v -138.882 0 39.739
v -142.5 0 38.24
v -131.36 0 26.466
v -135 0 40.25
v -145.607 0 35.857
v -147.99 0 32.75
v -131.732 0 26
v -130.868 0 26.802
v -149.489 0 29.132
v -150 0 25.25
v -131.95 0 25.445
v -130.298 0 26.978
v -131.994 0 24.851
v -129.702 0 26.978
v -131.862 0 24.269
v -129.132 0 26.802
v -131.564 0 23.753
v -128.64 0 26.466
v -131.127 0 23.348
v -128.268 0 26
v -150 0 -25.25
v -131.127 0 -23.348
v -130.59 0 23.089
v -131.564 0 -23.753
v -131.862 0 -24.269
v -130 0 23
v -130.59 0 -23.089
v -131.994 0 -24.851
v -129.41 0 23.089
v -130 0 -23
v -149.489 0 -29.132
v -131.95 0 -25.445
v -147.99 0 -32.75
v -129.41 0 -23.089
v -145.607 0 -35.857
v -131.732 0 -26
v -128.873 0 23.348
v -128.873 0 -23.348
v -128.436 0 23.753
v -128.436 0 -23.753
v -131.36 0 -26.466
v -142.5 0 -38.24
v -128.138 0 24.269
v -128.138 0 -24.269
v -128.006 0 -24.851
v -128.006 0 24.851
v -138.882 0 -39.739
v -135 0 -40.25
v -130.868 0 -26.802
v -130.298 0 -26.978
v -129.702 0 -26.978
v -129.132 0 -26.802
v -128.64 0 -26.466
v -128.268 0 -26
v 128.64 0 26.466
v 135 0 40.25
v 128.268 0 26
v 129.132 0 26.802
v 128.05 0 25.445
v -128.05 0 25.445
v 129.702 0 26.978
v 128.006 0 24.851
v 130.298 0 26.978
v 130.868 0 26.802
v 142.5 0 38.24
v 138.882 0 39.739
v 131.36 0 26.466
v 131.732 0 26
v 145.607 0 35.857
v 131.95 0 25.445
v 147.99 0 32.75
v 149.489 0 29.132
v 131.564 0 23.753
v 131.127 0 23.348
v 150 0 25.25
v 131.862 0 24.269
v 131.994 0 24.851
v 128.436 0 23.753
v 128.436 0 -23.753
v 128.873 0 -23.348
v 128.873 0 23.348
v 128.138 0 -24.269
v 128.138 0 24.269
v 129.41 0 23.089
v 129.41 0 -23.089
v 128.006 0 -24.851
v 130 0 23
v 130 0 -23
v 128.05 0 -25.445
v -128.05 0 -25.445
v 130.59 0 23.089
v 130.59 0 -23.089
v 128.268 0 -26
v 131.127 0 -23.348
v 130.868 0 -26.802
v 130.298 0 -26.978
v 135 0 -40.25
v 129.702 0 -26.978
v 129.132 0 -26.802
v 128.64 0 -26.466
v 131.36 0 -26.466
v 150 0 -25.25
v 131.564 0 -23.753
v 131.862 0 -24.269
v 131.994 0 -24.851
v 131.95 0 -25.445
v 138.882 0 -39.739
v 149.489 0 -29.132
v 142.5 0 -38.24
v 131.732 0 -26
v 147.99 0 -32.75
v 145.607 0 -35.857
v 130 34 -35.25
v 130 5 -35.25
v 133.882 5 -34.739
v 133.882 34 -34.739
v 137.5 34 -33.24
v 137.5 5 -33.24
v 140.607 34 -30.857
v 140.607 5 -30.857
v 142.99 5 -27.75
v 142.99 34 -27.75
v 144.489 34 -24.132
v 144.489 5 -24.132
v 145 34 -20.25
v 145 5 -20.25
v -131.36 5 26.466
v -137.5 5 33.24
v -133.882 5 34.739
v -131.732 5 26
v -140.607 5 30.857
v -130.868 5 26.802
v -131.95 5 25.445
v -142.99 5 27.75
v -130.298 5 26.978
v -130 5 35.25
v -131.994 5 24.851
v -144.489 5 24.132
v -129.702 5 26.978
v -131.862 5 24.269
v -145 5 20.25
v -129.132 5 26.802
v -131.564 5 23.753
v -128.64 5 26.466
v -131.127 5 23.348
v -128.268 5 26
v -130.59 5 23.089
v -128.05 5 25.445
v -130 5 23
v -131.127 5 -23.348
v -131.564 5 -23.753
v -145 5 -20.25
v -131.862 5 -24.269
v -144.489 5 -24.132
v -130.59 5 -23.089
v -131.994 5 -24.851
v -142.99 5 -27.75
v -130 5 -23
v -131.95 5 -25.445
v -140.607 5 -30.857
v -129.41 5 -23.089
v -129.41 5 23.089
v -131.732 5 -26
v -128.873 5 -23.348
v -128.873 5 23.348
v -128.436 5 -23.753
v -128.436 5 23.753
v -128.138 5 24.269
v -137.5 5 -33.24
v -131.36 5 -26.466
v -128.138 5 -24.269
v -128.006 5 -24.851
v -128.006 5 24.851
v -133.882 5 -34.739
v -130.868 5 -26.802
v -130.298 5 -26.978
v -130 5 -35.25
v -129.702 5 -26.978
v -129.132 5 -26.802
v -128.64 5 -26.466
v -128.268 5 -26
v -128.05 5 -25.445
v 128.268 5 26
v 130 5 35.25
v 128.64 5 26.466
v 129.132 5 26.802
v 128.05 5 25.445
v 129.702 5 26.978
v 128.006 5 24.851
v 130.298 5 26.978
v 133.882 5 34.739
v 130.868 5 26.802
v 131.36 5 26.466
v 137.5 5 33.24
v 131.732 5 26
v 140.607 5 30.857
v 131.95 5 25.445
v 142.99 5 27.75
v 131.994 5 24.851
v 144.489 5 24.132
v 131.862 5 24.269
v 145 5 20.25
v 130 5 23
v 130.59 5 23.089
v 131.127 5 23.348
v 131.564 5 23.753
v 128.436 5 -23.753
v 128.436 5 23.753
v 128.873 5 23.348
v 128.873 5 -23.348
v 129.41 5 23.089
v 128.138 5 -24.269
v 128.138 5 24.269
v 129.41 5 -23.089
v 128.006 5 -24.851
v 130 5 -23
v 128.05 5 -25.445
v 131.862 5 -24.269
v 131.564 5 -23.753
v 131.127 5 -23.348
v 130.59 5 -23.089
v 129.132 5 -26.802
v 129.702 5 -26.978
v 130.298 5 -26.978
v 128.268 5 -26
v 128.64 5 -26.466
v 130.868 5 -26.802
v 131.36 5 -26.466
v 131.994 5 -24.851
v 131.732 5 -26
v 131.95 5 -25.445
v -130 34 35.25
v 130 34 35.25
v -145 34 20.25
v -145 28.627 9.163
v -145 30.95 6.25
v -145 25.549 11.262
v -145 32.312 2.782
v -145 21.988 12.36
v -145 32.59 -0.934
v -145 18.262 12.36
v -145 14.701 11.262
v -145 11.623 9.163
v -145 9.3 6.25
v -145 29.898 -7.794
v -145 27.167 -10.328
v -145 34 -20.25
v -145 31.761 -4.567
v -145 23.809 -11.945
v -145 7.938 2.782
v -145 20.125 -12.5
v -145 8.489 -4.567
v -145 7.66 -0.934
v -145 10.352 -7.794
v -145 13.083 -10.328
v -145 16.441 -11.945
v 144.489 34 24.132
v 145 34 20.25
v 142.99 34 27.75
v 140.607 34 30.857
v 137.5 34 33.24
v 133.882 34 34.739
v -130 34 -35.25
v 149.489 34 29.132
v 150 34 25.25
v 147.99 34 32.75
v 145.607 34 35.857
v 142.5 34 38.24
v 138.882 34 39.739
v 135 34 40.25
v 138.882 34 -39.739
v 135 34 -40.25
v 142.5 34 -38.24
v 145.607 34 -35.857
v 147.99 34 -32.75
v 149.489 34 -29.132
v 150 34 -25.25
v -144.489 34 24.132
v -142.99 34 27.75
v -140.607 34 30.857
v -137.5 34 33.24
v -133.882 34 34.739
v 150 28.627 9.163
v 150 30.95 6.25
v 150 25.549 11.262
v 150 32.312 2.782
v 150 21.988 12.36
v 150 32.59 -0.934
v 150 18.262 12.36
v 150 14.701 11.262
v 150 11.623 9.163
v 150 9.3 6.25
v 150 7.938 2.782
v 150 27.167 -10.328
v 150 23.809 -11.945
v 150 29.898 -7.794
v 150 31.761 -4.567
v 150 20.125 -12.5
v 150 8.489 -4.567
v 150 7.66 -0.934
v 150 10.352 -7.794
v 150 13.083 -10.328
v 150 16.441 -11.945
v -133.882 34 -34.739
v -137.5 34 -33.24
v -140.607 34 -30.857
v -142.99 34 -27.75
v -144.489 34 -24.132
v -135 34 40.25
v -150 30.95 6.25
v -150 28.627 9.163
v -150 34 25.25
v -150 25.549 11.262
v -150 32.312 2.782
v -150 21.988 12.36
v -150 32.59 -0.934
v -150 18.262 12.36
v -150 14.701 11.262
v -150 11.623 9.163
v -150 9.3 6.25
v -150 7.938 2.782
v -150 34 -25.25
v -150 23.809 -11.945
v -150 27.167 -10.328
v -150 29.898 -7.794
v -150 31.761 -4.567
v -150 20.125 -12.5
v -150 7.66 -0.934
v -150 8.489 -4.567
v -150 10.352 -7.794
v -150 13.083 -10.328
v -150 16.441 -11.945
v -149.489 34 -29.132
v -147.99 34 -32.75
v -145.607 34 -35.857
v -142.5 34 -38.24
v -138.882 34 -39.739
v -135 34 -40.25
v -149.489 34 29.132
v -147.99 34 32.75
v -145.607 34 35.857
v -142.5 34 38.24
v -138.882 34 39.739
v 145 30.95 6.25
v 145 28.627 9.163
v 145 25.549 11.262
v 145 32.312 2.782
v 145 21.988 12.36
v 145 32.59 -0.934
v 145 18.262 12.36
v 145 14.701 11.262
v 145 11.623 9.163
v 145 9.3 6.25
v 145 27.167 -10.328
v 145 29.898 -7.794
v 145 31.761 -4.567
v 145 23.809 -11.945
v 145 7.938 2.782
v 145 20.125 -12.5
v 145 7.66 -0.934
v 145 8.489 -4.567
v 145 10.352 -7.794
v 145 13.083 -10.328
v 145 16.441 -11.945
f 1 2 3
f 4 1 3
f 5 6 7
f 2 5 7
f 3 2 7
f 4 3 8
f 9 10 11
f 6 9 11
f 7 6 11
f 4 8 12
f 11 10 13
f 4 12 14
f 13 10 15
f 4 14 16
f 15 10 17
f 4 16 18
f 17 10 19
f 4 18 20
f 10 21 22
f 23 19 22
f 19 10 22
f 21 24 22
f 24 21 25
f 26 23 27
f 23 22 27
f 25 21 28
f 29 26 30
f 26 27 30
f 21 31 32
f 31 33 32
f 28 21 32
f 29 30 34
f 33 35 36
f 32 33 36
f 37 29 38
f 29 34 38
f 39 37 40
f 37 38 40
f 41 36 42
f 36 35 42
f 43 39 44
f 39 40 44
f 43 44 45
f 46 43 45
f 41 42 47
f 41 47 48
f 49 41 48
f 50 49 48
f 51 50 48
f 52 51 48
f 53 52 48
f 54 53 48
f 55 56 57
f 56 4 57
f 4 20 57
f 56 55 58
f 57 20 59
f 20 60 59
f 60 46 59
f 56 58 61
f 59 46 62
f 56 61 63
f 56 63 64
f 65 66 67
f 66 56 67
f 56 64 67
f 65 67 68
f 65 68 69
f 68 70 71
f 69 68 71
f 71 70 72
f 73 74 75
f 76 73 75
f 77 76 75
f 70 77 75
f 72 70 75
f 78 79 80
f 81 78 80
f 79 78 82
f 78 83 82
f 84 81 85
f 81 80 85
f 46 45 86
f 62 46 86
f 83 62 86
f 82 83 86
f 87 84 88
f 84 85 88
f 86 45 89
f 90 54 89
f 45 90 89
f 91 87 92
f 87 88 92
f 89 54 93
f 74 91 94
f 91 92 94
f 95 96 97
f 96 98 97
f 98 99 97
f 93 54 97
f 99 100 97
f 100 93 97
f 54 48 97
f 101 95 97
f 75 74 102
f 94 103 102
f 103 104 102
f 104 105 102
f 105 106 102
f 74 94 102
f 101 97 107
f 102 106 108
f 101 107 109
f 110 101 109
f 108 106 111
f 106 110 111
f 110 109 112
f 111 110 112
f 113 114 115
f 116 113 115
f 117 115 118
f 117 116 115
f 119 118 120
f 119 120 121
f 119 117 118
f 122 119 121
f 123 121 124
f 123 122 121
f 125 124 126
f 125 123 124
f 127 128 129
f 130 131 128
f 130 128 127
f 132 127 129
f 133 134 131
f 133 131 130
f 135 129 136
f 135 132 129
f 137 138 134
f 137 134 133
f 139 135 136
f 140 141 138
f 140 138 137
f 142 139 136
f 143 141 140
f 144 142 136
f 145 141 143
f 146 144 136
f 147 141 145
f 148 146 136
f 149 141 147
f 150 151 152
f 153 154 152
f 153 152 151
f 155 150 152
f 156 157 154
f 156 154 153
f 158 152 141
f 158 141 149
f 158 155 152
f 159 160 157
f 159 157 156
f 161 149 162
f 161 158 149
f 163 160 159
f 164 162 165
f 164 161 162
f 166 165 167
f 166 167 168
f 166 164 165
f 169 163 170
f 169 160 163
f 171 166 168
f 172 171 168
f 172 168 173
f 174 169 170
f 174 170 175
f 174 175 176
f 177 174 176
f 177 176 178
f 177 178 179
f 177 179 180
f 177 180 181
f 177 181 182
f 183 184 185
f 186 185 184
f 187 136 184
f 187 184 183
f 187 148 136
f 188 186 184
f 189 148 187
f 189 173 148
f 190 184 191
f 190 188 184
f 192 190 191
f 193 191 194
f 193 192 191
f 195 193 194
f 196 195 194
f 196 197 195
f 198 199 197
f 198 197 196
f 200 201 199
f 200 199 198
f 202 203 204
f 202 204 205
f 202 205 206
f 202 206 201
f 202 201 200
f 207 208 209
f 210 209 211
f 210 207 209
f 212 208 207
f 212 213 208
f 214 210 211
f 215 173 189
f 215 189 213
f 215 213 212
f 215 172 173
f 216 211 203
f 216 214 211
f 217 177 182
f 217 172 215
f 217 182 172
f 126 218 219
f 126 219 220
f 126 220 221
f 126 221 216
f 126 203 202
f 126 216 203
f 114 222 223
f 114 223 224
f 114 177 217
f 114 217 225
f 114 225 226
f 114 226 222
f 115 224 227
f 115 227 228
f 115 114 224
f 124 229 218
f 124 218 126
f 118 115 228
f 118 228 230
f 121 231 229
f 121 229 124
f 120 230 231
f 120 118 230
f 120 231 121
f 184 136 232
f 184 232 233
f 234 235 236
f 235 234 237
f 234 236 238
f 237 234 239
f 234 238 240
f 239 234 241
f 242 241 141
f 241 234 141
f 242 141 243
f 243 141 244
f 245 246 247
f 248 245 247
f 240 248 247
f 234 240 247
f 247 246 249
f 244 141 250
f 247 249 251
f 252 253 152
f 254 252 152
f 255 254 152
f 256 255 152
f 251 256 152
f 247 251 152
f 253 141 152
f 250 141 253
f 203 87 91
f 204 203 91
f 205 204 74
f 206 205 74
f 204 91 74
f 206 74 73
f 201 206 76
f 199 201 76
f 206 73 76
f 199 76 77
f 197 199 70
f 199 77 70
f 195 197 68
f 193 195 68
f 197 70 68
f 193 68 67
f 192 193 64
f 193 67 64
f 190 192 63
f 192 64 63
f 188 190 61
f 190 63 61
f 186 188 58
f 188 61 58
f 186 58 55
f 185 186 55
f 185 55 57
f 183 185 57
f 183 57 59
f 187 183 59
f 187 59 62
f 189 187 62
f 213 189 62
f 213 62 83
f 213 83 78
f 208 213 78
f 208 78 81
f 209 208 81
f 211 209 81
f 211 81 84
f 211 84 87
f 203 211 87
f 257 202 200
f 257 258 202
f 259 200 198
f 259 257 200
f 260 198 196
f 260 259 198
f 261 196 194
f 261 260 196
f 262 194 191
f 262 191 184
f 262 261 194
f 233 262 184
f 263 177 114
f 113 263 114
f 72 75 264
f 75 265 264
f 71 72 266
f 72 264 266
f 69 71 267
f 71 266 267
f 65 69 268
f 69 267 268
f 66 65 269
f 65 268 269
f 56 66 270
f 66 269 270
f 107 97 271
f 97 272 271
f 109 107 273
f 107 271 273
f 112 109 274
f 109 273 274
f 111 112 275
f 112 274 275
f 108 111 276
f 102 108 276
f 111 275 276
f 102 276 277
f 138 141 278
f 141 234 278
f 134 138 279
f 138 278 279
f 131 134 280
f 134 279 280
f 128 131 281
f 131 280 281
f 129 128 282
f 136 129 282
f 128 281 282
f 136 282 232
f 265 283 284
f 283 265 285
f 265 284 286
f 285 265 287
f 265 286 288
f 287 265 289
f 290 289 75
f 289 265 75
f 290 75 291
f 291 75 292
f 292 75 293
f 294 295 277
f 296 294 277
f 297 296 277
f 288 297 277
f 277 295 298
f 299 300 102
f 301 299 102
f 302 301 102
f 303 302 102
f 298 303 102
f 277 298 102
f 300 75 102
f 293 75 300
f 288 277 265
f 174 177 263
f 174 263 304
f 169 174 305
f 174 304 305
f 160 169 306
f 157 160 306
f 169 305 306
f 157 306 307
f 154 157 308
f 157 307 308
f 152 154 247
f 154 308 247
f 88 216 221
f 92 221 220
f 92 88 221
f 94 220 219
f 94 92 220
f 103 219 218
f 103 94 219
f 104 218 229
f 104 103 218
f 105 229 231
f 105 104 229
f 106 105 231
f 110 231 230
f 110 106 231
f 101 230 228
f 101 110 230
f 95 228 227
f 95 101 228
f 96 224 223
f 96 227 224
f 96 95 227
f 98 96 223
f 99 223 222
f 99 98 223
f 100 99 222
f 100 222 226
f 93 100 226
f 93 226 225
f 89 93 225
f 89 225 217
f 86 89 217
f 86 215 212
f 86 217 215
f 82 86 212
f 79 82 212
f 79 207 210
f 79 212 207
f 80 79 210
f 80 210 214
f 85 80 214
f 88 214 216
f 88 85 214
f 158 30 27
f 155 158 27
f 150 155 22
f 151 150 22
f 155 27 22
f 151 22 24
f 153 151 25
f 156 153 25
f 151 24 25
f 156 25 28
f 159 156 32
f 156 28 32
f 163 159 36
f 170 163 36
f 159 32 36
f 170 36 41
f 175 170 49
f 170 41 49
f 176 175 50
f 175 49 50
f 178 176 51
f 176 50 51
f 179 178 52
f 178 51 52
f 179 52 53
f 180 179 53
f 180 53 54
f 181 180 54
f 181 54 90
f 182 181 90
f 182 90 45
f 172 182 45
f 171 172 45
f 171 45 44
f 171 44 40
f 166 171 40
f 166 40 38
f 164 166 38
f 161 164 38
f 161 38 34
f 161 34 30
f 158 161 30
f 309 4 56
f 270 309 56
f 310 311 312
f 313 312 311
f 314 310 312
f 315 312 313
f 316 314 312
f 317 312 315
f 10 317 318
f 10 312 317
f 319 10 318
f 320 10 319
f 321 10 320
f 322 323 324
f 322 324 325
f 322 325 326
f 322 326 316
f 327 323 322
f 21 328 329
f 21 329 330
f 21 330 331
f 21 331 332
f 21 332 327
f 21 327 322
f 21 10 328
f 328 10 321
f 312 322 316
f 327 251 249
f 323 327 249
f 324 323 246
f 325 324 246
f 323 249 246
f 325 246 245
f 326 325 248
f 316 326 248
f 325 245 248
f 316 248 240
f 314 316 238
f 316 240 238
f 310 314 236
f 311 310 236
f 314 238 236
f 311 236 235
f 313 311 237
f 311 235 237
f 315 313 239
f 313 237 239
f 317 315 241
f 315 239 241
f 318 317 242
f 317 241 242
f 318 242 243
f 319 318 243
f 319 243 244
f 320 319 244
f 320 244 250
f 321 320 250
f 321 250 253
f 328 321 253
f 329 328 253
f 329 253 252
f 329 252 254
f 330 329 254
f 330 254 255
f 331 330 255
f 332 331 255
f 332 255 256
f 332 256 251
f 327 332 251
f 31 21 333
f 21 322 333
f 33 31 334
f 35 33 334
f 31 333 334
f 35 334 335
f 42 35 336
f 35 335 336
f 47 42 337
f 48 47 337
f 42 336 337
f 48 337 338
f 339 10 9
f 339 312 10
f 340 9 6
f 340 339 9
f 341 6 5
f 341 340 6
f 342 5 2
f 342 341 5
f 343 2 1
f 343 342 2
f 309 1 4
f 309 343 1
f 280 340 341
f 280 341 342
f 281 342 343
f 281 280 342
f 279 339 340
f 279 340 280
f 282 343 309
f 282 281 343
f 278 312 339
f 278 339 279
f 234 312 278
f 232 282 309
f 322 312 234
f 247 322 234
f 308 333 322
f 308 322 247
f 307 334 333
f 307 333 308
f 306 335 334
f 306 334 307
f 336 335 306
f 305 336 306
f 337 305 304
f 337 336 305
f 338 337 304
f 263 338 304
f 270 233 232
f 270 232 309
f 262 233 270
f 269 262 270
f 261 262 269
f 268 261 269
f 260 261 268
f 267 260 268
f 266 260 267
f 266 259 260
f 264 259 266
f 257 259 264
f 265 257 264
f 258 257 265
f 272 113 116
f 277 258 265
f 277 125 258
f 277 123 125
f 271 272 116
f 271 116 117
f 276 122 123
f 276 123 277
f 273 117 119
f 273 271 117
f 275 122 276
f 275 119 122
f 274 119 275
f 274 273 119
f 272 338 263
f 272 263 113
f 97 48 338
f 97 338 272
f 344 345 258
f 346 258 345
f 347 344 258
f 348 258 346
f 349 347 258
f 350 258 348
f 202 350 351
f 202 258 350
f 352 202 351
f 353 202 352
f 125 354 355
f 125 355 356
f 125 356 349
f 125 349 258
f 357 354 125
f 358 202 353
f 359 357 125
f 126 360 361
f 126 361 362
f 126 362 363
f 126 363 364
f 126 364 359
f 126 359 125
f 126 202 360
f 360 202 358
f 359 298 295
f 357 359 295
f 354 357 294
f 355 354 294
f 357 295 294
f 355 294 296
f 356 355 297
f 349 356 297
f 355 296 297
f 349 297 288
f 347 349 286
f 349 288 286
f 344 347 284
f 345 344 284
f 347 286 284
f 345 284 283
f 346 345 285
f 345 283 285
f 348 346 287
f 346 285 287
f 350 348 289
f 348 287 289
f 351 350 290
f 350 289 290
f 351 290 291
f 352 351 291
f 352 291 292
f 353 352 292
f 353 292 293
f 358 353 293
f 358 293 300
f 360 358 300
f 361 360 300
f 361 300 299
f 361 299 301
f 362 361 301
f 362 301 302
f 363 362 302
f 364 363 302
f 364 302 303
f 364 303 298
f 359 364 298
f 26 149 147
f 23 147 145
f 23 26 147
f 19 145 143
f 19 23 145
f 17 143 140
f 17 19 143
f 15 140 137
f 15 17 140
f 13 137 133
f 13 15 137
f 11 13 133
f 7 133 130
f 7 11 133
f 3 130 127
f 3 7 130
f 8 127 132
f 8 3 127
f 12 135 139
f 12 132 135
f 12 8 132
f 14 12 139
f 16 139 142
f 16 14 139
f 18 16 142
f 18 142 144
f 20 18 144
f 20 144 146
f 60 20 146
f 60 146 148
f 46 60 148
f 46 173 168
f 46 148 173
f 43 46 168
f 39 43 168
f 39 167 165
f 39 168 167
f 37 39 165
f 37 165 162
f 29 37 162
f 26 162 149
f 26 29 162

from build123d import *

# Parameters (mm, degrees)
SKETCH1_W               = 300
SKETCH1_H               = 80.5
SKETCH1_W_2             = 290
SKETCH1_H_2             = 70.5
BOSS_EXTRUDE1_DEPTH     = 34
SKETCH1_3_W             = 290
SKETCH1_3_H             = 70.5
BOSS_EXTRUDE2_DEPTH     = 5
FILLET1_R               = 15
FILLET2_R               = 15
FILLET3_R               = 15
FILLET4_R               = 15
FILLET5_R               = 15
FILLET6_R               = 15
FILLET7_R               = 15
FILLET8_R               = 15
SKETCH2_R               = 2
CUT_EXTRUDE1_DEPTH      = 159.984472512
MIRROR2_COPY_1_SKETCH_R = 2
MIRROR2_COPY_1_DEPTH    = 159.984472512
SKETCH3_R               = 12.5
CUT_EXTRUDE2_DEPTH      = 305.591632354


with BuildPart() as part:
    # Sketch1 → Boss-Extrude1 (new body)
    with BuildSketch(Plane(origin=(0, 0, 0), x_dir=(1, 0, 0), z_dir=(0, 1, 0))):
        Rectangle(SKETCH1_W, SKETCH1_H)
        Rectangle(SKETCH1_W_2, SKETCH1_H_2, mode=Mode.SUBTRACT)
    extrude(amount=BOSS_EXTRUDE1_DEPTH)

    # Sketch1<3> → Boss-Extrude2 (add)
    with BuildSketch(Plane(origin=(0, 0, 0), x_dir=(1, 0, 0), z_dir=(0, 1, 0))):
        Rectangle(SKETCH1_3_W, SKETCH1_3_H)
    extrude(amount=BOSS_EXTRUDE2_DEPTH)

    # Fillet1
    fillet1_edges = [part.edges().sort_by_distance(p)[0] for p in [
        (-150, 17, 40.25),
    ]]
    fillet(fillet1_edges, radius=FILLET1_R)

    # Fillet2
    fillet2_edges = [part.edges().sort_by_distance(p)[0] for p in [
        (-150, 17, -40.25),
    ]]
    fillet(fillet2_edges, radius=FILLET2_R)

    # Fillet3
    fillet3_edges = [part.edges().sort_by_distance(p)[0] for p in [
        (150, 17, -40.25),
    ]]
    fillet(fillet3_edges, radius=FILLET3_R)

    # Fillet4
    fillet4_edges = [part.edges().sort_by_distance(p)[0] for p in [
        (150, 17, 40.25),
    ]]
    fillet(fillet4_edges, radius=FILLET4_R)

    # Fillet5
    fillet5_edges = [part.edges().sort_by_distance(p)[0] for p in [
        (-145, 19.5, -35.25),
    ]]
    fillet(fillet5_edges, radius=FILLET5_R)

    # Fillet6
    fillet6_edges = [part.edges().sort_by_distance(p)[0] for p in [
        (-145, 19.5, 35.25),
    ]]
    fillet(fillet6_edges, radius=FILLET6_R)

    # Fillet7
    fillet7_edges = [part.edges().sort_by_distance(p)[0] for p in [
        (145, 19.5, -35.25),
    ]]
    fillet(fillet7_edges, radius=FILLET7_R)

    # Fillet8
    fillet8_edges = [part.edges().sort_by_distance(p)[0] for p in [
        (145, 19.5, 35.25),
    ]]
    fillet(fillet8_edges, radius=FILLET8_R)

    # Sketch2 → Cut-Extrude1 (cut, through all)
    with BuildSketch(Plane(origin=(0, 0, 0), x_dir=(-1, 0, 0), z_dir=(0, -1, 0))):
        with Locations((-130, -25)):
            Circle(SKETCH2_R)
    cut_extrude1 = extrude(amount=-CUT_EXTRUDE1_DEPTH, mode=Mode.SUBTRACT)

    # Mirror1: Cut-Extrude1 across plane
    add(cut_extrude1.mirror(Plane.XY), mode=Mode.SUBTRACT)

    # Mirror2: Cut-Extrude1 across plane
    add(cut_extrude1.mirror(Plane(origin=(0, 0, 0), x_dir=(0, 0, 1), z_dir=(1, 0, 0))), mode=Mode.SUBTRACT)

    # Mirror2 copy 1 sketch → Mirror2 copy 1 (cut, through all)
    with BuildSketch(Plane.XZ):
        with Locations((-130, -25)):
            Circle(MIRROR2_COPY_1_SKETCH_R)
    extrude(amount=-MIRROR2_COPY_1_DEPTH, mode=Mode.SUBTRACT)

    # Sketch3 → Cut-Extrude2 (cut, through all)
    with BuildSketch(Plane(origin=(150, 0, 0), x_dir=(0, 0, -1), z_dir=(1, 0, 0))):
        with Locations((0, 20.125)):
            Circle(SKETCH3_R)
    extrude(amount=-CUT_EXTRUDE2_DEPTH, mode=Mode.SUBTRACT)


solid = part.part
